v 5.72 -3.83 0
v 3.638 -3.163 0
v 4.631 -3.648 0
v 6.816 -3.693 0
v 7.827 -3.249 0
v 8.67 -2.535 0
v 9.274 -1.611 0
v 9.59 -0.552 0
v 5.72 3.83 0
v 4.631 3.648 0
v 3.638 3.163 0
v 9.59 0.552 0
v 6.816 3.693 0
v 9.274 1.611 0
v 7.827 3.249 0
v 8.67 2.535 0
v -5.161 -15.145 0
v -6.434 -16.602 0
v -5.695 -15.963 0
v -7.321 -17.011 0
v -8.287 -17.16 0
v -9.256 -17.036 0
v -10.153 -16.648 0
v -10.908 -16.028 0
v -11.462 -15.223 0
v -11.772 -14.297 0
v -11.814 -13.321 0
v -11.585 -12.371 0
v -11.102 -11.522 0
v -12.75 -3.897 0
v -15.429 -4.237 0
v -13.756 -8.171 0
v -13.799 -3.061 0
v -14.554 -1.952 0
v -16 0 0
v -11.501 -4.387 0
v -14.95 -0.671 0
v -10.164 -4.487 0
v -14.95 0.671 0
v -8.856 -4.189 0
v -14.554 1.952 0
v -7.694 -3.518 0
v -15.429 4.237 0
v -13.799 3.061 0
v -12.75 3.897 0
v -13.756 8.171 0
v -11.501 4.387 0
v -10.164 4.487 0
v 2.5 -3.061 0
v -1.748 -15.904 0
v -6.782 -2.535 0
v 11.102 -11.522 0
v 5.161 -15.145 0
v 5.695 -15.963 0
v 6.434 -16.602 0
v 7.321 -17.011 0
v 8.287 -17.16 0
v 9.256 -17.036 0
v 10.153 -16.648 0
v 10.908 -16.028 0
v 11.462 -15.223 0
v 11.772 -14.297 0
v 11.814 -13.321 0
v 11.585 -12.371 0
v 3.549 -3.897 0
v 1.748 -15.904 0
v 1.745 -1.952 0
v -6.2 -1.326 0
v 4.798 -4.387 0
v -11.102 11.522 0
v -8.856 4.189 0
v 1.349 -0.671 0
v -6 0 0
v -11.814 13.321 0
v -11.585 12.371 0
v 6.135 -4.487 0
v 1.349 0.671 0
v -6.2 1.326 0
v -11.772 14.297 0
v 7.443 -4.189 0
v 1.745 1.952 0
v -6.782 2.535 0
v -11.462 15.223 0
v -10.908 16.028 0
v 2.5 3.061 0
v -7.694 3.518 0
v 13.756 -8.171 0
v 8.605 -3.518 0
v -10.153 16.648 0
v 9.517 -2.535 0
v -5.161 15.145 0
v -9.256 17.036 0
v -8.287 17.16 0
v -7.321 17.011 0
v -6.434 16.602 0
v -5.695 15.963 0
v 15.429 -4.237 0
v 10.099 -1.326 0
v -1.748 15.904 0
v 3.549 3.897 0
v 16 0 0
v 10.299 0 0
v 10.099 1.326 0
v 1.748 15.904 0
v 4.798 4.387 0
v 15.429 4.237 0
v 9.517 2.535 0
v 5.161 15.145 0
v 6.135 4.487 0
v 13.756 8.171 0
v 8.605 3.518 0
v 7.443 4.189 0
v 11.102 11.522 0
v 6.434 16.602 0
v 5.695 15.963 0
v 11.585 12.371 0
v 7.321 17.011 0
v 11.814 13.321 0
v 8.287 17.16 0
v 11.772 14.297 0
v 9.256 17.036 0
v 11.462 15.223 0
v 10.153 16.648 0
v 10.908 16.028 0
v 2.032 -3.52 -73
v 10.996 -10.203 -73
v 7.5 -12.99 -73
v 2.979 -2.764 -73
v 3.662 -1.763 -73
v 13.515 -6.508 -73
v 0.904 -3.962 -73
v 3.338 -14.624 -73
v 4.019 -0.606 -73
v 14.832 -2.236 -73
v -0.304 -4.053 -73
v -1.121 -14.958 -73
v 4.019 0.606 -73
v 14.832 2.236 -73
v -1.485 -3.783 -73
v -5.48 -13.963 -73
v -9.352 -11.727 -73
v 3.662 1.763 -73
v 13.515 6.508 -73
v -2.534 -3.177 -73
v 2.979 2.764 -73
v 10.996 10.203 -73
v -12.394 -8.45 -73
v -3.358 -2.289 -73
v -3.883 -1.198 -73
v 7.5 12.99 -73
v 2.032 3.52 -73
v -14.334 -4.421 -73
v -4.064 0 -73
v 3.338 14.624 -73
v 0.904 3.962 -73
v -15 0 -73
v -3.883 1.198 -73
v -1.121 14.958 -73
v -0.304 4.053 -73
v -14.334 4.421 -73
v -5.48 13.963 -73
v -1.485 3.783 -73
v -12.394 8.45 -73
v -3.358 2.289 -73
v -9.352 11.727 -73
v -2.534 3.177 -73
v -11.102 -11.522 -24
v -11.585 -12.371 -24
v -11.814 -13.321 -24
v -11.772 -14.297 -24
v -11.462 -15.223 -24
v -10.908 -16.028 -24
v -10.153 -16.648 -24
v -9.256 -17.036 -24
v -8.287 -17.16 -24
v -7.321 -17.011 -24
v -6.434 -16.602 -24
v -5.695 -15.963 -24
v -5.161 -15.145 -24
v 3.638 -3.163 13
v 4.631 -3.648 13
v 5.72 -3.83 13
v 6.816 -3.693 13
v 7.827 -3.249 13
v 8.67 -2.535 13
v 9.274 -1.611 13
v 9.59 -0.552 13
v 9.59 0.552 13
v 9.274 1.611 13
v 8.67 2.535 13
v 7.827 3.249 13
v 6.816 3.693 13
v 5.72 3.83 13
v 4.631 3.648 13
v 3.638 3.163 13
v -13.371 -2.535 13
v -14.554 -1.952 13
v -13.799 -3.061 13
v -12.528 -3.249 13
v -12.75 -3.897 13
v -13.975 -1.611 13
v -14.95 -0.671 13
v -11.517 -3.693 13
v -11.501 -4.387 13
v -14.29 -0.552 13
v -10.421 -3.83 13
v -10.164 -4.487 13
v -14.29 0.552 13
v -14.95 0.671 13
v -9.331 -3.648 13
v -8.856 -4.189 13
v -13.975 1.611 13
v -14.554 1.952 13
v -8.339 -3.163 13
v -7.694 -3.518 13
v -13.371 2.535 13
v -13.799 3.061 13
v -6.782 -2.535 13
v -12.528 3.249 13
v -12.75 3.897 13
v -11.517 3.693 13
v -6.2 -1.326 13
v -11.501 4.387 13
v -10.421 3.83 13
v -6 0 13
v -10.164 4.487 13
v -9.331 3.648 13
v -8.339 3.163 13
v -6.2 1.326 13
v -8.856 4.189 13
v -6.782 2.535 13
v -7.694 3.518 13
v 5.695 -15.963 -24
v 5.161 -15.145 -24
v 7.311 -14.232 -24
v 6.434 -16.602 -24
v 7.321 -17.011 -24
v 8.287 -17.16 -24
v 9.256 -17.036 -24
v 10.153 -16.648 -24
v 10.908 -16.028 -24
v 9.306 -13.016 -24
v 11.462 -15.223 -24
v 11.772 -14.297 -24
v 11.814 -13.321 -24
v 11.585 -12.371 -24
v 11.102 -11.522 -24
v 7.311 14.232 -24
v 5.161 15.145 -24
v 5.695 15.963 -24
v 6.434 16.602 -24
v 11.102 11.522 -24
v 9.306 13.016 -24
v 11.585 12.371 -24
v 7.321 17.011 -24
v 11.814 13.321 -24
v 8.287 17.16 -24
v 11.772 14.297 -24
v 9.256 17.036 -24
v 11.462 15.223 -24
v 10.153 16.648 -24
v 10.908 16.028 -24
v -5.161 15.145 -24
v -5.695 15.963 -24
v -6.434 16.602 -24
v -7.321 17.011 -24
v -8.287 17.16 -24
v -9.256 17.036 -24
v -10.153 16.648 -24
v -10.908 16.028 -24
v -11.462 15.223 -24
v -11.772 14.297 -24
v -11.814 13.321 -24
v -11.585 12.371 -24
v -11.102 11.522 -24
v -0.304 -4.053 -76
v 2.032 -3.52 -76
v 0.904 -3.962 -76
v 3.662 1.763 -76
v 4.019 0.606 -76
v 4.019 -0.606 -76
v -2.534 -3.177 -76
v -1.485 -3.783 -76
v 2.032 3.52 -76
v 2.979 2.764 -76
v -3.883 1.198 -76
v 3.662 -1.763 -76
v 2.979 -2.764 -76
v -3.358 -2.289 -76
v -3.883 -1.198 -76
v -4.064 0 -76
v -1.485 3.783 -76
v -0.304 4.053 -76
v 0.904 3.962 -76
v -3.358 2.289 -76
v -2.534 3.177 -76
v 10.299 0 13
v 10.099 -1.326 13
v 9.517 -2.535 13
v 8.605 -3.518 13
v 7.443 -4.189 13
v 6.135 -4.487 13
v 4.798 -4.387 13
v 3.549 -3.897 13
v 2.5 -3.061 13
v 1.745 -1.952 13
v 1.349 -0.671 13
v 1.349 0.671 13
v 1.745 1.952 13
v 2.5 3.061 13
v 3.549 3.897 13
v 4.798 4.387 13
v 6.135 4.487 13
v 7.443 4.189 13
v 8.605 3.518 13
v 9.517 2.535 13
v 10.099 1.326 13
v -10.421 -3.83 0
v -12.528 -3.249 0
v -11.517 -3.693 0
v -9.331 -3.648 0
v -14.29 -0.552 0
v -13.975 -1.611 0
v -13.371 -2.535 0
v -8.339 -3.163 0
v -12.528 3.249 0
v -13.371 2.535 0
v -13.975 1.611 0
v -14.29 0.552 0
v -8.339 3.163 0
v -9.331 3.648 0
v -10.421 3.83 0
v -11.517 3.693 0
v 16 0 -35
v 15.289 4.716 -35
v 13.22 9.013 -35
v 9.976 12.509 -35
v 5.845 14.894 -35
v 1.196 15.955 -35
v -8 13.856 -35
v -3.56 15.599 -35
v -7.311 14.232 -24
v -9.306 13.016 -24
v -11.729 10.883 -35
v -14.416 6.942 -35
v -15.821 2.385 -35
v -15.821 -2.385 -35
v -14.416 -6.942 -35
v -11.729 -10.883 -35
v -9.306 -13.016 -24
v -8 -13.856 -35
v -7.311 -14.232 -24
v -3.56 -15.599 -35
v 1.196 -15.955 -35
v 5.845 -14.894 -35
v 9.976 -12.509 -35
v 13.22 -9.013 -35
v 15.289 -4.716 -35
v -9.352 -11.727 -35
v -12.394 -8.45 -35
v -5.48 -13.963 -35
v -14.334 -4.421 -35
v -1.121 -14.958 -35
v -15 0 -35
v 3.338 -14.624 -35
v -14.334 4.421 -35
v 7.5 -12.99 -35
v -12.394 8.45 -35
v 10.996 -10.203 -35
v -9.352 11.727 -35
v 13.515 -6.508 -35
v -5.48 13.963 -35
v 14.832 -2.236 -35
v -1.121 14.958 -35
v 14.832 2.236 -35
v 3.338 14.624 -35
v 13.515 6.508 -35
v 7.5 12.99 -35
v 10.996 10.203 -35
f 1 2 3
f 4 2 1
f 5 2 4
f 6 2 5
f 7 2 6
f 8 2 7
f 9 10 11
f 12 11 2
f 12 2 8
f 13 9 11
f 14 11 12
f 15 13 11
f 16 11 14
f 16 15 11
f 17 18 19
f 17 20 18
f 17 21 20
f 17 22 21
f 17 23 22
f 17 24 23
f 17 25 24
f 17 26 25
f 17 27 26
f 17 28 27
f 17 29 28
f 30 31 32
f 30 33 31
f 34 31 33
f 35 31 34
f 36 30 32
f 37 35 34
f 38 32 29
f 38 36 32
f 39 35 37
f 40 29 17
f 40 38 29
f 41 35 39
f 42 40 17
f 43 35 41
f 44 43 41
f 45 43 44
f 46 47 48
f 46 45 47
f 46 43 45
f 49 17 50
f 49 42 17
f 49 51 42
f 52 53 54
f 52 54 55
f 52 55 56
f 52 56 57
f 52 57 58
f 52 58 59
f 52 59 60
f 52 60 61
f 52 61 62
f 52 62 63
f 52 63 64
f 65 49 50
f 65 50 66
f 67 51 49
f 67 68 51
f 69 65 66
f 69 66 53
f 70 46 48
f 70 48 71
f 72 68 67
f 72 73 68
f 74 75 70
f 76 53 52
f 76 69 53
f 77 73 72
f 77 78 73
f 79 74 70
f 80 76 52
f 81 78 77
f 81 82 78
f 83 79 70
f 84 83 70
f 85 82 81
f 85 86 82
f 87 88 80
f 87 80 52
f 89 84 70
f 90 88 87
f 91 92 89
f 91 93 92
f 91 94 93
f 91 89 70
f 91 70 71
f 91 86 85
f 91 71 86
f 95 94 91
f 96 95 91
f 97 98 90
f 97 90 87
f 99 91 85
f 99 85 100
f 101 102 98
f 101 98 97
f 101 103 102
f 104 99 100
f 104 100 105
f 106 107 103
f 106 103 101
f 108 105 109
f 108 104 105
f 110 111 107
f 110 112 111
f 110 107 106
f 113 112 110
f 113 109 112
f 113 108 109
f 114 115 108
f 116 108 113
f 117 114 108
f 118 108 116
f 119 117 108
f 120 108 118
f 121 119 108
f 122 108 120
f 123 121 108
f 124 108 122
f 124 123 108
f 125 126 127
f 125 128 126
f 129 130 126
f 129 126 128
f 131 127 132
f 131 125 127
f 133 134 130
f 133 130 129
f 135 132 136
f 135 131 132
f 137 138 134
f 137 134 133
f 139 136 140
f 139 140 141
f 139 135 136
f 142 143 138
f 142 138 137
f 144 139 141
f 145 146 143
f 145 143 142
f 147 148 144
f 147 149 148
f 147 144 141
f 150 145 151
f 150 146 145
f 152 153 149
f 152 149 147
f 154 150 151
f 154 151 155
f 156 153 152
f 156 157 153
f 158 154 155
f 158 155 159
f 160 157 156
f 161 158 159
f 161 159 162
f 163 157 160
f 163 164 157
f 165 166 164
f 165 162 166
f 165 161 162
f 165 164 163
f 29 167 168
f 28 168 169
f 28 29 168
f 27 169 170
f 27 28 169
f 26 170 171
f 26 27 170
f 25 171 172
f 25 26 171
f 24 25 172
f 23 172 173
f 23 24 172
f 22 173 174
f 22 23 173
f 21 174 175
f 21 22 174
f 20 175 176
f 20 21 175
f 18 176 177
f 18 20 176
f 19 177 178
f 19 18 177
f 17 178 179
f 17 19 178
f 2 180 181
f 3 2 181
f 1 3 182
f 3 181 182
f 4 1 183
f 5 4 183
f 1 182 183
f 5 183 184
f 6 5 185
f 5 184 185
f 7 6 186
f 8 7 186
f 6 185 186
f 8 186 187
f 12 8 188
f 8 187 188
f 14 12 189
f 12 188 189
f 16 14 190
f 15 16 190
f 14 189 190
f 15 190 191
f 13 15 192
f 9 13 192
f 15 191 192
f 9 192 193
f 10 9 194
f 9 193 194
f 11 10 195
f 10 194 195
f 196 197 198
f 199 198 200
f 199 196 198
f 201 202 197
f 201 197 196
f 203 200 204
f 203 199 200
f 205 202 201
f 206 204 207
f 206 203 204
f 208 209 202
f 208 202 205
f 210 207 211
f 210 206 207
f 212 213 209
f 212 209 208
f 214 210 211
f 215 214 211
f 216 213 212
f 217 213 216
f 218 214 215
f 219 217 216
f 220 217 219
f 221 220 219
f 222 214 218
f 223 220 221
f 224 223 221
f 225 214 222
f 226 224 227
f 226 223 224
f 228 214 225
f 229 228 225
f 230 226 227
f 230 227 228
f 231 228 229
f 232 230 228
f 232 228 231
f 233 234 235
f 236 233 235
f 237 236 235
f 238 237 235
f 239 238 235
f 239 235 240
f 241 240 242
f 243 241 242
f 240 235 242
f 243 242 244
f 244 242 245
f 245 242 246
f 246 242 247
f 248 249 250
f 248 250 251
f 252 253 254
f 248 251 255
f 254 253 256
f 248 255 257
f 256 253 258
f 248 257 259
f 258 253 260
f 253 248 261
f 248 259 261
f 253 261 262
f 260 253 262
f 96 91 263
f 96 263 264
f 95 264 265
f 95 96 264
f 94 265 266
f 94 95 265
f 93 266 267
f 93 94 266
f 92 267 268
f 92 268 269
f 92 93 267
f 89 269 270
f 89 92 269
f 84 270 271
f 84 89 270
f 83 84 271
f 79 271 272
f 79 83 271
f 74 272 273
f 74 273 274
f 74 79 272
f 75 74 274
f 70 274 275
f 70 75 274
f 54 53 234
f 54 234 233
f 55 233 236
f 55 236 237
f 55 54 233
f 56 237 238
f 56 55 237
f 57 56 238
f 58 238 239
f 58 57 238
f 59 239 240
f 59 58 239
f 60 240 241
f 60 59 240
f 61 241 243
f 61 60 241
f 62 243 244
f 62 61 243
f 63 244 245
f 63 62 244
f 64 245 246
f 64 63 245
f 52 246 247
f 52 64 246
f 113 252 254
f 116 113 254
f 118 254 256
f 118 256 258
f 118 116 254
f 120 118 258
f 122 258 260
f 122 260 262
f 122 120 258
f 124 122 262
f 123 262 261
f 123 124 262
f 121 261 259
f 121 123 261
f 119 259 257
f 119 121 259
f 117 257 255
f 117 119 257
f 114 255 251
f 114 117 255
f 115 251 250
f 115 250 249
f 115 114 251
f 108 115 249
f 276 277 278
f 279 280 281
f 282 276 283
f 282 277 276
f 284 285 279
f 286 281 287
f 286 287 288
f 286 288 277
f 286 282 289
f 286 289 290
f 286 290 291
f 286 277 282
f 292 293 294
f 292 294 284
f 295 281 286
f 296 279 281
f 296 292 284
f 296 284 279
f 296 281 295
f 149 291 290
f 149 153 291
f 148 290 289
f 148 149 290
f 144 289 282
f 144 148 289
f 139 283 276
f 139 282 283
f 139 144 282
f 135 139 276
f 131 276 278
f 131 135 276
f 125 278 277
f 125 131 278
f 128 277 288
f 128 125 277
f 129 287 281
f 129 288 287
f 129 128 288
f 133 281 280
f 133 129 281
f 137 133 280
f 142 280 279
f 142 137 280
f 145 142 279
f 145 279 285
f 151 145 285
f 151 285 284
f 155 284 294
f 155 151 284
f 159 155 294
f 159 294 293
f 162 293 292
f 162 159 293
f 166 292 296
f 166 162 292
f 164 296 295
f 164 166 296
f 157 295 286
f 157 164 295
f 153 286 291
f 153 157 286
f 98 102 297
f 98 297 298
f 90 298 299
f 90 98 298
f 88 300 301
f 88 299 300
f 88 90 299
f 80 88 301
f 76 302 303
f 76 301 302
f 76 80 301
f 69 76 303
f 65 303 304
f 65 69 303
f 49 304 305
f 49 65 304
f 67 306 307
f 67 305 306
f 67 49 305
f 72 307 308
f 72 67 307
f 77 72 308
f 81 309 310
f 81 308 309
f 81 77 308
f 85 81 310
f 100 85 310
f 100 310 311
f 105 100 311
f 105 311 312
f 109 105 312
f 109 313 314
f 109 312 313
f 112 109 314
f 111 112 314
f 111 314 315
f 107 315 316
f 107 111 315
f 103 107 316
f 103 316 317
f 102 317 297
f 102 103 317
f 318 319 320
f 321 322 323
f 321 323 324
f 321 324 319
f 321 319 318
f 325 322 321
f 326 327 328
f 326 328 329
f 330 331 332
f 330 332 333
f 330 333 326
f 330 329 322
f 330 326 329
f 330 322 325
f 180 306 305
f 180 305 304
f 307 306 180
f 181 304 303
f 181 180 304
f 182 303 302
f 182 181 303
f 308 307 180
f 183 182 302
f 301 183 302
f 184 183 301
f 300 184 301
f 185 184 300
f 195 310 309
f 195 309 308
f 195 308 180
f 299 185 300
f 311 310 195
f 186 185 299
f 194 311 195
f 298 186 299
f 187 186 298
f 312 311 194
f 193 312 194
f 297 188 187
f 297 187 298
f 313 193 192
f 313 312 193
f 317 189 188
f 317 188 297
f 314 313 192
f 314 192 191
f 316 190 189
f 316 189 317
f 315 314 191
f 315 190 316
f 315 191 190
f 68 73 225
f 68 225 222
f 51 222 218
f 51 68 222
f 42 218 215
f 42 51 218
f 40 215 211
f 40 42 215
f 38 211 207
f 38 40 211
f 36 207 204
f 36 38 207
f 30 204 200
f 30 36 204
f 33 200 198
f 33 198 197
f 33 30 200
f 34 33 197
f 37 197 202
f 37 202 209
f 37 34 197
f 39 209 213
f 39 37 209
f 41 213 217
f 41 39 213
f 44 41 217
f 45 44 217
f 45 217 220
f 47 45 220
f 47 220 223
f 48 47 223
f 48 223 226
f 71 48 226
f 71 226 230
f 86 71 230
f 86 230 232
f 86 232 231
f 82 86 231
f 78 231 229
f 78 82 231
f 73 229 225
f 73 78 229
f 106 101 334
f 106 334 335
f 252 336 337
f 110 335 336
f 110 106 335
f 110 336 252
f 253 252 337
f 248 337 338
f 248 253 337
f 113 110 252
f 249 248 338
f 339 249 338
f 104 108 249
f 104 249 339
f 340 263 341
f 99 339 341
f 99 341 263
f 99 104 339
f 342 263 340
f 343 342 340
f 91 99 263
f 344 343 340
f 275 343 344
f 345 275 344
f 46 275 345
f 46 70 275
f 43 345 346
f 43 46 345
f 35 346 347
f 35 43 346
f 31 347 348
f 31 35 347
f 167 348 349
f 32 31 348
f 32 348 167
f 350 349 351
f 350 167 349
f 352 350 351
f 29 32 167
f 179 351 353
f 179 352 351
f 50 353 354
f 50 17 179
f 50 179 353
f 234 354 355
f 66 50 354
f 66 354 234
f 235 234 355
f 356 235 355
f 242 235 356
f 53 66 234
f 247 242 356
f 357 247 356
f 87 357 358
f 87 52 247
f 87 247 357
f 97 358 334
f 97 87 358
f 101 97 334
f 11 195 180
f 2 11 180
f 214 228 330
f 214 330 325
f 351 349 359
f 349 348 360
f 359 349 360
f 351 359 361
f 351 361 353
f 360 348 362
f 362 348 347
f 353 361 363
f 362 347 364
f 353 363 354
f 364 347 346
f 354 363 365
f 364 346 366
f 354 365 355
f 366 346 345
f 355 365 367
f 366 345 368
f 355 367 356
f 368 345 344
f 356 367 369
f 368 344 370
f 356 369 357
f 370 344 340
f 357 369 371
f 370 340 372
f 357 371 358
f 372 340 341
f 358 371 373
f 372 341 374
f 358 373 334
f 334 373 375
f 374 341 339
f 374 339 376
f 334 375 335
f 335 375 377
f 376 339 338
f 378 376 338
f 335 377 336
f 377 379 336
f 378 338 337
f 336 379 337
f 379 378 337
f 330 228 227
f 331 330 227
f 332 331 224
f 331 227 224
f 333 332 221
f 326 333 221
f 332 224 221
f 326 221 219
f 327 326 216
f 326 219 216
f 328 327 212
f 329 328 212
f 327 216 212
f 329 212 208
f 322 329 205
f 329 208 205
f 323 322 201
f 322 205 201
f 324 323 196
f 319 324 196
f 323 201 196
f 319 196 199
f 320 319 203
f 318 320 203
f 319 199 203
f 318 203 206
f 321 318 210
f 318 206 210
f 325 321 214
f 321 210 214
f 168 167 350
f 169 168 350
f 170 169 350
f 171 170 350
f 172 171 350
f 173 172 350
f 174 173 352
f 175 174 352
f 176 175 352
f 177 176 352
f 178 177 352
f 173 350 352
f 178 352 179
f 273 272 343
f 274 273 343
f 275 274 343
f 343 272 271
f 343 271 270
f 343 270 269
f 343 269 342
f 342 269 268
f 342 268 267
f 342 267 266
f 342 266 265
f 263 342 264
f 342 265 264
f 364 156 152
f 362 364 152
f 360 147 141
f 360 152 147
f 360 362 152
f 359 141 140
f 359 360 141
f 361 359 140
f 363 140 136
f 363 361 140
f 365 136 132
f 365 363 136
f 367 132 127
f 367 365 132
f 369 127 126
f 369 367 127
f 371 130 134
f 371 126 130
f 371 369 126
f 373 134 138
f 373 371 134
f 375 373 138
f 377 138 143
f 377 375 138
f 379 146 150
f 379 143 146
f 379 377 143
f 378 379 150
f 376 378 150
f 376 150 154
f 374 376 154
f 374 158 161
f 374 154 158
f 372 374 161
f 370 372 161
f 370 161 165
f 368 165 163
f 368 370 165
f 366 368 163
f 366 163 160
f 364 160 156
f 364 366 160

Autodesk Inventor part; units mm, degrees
ref_plane "YZ Plane" through (0, 0, 0) normal (1, 0, 0) x (0, 1, 0)
ref_plane "XZ Plane" through (0, 0, 0) normal (0, 1, 0) x (-1, 0, 0)
ref_plane "XY Plane" through (0, 0, 0) normal (0, 0, 1) x (1, 0, 0)
sketch "Sketch1" plane through (0, 0, 0) normal (0, 0, 1) x (1, 0, 0)
  circle A0 centre (0, 0) radius 16
  dimension "d0" = 32
extrude "Extrusion1" add sketch "Sketch1" against normal blind 35
sketch "Sketch2" plane through (0, 0, -35) normal (0, 0, -1) x (-1, 0, 0)
  circle A0 centre (0, 0) radius 15
  dimension "d3" = 30
extrude "Extrusion2" add sketch "Sketch2" along normal blind 38
sketch "Sketch3" plane through (0, 0, -73) normal (0, 0, -1) x (-1, 0, 0)
  circle A0 centre (0, 0) radius 4.064
extrude "Extrusion3" add sketch "Sketch3" along normal blind 3
sketch "Sketch4" plane through (0, 0, 0) normal (0, 0, 1) x (1, 0, 0)
  point P0 (0, 0)
sketch "Sketch5" plane through (0, 0, 0) normal (0, 0, 1) x (1, 0, 0)
  circle A0 centre (-10.5, 0) radius 4.5
  circle A1 centre (0, 0) radius 15 projected
  circle A2 centre (5.7991, 0) radius 4.5
  dimension "d8" = 9
extrude "Extrusion4" add sketch "Sketch5" along normal blind 13 contours A0 | A2
sketch "Sketch6" plane through (-10.5, 0, 13) normal (0, 0, 1) x (1, 0, 0)
  arc A0 (2.1608, 3.1628) -> (2.1608, -3.1628) centre (0, 0) ccw
  circle A1 centre (16.2991, 0) radius 4.5 projected
  arc A2 (14.1383, -3.1628) -> (14.1383, 3.1628) centre (16.2991, 0) ccw
  circle A3 centre (0, 0) radius 4.5 projected
  line L0 (14.1383, 3.1628) -> (14.1383, -3.1628)
  line L1 (2.1608, 3.1628) -> (2.1608, -3.1628)
  point P0 (10.5, 0)
extrude "Extrusion5" cut sketch "Sketch6" against normal blind 13 contours L1 A0 | L0 A2
sketch "Sketch7" plane through (0, 0, 0) normal (0, 0, 1) x (1, 0, 0)
  circle A0 centre (0, 0) radius 16 projected
  circle A1 centre (-8.3308, 13.6601) radius 3.5
  line L0 (0, -22.632) -> (0, 23.7921) projected
  circle A2 centre (8.3308, 13.6601) radius 3.5
  line L1 (-22.4, 0) -> (22.4, 0) projected
  circle A3 centre (-8.3308, -13.6601) radius 3.5
  circle A4 centre (8.3308, -13.6601) radius 3.5
  dimension "d14" = 7
extrude "Extrusion6" add sketch "Sketch7" against normal blind 24 contours A2 A0 | A0 A2 | A4 A0 | A0 A4 | A3 A0 | A0 A3 | A1 A0 | A0 A1
properties part number "pump"
